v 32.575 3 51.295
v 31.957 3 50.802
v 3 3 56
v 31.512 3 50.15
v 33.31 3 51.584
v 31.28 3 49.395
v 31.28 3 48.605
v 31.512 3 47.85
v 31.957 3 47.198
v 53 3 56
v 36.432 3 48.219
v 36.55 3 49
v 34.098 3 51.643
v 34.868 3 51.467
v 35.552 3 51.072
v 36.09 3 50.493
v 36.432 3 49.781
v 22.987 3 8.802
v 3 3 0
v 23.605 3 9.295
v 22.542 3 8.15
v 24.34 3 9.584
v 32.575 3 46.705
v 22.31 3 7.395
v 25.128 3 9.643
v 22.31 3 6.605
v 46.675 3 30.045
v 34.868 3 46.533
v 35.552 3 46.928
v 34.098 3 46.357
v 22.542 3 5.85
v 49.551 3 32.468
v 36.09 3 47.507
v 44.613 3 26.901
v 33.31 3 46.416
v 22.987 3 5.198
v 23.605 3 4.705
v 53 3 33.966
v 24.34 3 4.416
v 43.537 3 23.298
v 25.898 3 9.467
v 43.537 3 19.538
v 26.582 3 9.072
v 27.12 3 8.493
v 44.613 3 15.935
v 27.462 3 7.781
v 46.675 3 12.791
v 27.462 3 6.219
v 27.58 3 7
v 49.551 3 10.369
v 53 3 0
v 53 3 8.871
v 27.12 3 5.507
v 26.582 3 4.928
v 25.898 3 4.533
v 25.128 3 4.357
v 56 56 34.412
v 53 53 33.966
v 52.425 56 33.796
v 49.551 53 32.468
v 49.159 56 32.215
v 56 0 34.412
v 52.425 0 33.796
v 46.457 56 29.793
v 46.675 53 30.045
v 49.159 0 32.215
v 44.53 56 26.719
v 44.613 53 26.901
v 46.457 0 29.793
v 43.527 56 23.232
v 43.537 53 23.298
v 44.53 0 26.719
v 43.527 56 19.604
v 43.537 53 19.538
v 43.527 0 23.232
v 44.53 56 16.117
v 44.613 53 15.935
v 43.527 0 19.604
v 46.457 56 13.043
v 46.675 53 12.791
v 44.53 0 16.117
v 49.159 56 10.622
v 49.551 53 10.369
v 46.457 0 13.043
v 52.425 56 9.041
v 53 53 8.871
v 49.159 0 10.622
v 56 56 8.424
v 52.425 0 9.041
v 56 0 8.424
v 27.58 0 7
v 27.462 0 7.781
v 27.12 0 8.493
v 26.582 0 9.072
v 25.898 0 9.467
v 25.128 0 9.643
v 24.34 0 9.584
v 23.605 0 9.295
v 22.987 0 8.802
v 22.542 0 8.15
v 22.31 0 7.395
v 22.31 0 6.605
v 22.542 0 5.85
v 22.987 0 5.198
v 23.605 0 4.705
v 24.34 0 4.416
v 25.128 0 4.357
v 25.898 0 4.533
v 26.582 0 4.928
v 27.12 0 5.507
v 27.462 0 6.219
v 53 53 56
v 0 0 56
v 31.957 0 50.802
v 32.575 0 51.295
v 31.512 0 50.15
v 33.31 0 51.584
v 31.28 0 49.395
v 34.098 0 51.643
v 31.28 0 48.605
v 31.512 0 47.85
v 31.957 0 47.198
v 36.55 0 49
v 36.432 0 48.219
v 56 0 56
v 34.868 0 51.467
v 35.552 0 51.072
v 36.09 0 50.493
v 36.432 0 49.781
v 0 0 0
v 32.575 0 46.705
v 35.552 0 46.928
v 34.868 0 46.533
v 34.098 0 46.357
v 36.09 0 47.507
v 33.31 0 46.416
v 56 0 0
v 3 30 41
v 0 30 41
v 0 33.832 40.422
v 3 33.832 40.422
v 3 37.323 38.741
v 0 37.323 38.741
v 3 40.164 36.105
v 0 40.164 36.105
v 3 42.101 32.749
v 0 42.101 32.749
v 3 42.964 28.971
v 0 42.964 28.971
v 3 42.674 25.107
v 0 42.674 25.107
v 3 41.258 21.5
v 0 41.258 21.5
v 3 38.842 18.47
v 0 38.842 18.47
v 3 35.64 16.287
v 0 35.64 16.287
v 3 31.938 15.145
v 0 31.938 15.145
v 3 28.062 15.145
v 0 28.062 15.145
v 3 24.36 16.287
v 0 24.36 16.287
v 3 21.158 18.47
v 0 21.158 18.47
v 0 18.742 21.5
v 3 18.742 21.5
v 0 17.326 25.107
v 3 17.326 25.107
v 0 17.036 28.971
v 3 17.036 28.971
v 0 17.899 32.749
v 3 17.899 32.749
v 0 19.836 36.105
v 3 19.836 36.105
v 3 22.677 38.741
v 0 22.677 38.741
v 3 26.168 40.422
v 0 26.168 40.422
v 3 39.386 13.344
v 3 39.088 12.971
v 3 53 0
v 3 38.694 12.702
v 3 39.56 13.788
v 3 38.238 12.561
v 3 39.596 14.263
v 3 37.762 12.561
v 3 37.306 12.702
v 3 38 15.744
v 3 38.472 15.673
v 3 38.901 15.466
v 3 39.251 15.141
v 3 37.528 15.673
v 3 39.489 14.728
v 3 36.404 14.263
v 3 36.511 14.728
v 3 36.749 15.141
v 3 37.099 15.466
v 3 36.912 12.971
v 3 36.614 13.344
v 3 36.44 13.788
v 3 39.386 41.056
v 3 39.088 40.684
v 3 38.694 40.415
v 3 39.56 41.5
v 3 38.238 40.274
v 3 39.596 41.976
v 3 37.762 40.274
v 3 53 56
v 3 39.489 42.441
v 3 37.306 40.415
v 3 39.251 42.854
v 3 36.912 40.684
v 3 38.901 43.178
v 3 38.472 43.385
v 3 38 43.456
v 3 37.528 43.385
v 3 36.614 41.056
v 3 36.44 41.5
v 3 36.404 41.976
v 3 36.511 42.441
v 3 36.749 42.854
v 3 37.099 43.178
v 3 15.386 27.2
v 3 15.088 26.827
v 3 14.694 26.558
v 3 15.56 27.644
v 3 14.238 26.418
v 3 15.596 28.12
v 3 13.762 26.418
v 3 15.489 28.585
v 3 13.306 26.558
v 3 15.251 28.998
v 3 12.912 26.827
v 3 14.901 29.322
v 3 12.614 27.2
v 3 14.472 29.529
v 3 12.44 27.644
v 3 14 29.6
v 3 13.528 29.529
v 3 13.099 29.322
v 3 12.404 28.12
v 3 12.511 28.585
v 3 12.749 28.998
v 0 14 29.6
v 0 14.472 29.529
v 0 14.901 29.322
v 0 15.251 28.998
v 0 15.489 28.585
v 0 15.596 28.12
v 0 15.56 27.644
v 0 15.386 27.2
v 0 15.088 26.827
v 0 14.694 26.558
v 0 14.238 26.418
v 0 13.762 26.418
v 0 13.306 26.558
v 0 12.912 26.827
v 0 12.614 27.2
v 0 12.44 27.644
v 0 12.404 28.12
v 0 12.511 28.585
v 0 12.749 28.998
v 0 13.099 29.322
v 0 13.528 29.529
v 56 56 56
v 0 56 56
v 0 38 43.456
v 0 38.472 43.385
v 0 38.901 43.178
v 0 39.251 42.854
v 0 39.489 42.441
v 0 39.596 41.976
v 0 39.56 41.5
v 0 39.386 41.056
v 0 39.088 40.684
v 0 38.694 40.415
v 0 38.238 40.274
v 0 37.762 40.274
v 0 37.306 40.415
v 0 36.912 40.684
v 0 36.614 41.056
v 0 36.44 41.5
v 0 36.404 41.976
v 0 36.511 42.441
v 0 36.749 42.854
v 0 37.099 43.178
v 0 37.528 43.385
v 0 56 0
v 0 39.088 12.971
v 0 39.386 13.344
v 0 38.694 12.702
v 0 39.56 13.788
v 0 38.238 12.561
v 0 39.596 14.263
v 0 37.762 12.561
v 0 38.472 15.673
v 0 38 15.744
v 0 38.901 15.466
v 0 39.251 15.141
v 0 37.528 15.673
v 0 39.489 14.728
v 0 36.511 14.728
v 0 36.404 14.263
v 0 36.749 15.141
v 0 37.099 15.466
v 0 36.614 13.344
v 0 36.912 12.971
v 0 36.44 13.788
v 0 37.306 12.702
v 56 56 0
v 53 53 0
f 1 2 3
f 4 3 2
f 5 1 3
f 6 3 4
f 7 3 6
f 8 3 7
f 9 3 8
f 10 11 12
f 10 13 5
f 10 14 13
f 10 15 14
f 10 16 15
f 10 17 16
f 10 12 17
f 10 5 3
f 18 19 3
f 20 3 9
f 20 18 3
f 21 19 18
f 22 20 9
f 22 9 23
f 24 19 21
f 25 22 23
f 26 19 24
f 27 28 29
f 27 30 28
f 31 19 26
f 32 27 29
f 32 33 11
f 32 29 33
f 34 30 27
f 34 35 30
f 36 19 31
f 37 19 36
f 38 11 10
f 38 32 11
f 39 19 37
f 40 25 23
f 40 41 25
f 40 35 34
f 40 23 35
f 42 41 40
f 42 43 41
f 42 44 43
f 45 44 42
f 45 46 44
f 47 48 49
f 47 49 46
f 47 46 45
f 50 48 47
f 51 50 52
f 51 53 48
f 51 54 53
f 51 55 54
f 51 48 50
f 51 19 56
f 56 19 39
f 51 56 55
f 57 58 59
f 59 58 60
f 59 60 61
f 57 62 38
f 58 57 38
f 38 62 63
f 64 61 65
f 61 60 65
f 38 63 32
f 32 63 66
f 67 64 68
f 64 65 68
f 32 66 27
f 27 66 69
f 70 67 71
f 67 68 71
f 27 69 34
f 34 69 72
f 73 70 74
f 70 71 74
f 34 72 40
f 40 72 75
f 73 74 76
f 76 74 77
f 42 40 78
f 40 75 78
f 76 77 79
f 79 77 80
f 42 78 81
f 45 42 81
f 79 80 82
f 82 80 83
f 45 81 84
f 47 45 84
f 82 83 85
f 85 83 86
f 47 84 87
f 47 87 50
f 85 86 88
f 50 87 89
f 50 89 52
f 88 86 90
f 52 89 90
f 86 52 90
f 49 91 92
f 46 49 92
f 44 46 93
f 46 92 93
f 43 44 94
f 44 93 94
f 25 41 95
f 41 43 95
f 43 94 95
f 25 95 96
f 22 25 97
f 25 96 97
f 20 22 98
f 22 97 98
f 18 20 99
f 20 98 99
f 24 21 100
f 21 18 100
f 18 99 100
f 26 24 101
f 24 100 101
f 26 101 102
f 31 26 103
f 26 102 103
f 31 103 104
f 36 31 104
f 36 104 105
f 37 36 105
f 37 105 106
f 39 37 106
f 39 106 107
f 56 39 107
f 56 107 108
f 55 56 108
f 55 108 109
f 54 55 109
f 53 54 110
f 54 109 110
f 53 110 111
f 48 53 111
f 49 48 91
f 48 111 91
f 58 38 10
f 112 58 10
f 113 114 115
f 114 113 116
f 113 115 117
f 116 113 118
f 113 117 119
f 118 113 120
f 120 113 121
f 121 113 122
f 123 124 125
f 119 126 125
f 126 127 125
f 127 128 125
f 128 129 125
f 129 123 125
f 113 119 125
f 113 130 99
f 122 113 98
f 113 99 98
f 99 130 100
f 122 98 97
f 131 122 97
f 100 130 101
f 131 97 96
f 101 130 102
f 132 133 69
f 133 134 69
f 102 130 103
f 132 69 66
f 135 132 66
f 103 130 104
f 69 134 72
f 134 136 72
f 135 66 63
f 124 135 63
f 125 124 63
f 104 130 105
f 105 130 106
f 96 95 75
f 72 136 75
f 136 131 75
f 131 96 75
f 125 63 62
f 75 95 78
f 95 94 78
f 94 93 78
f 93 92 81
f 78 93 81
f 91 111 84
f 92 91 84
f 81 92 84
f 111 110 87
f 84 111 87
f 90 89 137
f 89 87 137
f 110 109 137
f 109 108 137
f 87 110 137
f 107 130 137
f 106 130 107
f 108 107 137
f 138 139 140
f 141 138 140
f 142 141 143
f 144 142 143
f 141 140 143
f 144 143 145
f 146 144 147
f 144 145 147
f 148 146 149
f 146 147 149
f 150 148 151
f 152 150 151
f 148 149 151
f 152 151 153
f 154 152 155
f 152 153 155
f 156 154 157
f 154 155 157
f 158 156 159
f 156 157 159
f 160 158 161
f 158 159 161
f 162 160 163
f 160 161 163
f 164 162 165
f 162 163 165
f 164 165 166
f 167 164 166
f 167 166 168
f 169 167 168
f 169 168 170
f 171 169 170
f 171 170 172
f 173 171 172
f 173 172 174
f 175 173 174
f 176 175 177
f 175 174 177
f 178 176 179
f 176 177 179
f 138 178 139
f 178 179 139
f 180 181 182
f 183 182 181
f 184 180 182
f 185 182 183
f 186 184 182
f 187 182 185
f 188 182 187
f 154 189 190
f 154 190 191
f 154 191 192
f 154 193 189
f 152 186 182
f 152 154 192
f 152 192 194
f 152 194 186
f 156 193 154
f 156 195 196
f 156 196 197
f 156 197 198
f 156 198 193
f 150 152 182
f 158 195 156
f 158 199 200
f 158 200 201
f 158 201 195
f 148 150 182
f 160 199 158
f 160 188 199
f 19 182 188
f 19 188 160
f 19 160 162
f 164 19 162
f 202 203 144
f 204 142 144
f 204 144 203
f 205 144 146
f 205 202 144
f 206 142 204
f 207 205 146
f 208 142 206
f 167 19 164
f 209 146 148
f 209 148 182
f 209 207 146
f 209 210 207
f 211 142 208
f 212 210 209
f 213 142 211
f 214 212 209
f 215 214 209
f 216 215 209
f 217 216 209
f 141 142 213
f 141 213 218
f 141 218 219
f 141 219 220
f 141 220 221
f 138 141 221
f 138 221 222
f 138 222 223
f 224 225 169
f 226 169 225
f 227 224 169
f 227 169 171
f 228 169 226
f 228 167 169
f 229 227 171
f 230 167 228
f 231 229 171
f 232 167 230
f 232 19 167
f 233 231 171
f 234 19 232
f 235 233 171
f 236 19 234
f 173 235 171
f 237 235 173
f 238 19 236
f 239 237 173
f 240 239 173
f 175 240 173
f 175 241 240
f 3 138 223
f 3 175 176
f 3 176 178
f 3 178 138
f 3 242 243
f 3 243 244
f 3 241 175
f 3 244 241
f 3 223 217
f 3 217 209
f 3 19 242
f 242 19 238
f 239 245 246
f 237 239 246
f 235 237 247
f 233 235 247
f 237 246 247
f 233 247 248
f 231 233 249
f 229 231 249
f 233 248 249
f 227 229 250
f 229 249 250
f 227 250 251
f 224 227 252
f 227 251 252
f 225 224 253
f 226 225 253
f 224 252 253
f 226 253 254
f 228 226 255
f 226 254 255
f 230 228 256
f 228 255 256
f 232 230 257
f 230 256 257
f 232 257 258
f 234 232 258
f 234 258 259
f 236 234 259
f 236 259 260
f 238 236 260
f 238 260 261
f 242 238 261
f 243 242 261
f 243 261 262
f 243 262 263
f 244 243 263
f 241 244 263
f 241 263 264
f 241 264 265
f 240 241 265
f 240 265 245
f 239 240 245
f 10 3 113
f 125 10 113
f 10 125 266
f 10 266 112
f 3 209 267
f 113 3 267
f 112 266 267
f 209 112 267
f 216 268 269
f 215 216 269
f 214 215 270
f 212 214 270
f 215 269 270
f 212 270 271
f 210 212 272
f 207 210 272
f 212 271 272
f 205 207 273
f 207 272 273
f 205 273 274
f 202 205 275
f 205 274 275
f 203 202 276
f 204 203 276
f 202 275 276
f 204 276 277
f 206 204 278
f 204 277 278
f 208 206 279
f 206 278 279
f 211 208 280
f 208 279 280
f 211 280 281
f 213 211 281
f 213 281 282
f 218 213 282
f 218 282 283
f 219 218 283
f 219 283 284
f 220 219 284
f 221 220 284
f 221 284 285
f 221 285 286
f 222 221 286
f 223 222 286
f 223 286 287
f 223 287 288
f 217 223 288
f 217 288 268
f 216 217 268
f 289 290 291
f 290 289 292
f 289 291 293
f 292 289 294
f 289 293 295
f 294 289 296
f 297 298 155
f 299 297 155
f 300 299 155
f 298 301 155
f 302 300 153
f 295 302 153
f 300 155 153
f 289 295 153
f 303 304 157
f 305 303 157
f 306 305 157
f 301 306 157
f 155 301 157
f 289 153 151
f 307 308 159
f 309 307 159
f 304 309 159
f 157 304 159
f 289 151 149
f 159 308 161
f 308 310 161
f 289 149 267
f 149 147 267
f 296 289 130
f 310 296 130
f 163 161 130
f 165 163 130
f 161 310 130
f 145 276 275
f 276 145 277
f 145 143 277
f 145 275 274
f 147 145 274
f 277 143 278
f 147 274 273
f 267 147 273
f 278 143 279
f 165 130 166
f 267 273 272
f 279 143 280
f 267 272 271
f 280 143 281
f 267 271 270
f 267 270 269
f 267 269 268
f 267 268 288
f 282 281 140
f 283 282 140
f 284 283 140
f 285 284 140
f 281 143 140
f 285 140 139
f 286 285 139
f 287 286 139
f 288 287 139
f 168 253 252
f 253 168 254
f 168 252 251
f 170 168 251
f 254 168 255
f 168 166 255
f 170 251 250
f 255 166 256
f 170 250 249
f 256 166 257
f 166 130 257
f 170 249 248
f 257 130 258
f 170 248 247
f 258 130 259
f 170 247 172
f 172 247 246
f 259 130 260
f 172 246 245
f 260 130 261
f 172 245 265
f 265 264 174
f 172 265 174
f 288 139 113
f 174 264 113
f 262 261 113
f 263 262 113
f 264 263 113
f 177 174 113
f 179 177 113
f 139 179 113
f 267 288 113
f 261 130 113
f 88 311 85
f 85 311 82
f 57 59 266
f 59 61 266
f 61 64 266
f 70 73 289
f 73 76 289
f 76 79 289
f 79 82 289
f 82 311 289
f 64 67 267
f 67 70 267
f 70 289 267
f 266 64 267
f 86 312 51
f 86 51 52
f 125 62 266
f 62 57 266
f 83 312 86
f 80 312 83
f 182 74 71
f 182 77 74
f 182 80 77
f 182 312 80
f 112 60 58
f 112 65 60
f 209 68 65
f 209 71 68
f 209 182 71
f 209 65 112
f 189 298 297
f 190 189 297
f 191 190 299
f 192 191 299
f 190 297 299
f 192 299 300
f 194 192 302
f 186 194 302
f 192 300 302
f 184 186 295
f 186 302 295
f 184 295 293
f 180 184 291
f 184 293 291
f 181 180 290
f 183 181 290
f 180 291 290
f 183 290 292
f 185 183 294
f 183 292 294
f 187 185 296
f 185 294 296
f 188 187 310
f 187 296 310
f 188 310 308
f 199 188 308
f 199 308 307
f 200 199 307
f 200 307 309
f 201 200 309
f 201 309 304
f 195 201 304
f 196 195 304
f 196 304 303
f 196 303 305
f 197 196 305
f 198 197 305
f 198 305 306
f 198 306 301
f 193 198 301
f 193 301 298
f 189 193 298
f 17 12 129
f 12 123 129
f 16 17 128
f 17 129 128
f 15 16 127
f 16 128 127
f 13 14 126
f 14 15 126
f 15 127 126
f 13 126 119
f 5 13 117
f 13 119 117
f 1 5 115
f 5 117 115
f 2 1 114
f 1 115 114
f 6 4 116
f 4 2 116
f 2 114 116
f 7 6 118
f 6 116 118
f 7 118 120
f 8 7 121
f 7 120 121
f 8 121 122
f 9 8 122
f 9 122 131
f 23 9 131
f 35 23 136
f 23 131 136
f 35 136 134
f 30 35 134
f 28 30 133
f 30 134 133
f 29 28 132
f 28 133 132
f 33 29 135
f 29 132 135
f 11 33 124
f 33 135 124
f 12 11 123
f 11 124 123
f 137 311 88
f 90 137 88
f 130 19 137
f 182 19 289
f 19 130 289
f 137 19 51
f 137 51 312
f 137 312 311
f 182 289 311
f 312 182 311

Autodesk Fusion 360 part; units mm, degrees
sketch "Esboço1" plane through (0, 0, 0) normal (0, 1, 0) x (1, 0, 0)
  line L0 (0, 0) -> (56, 0)
  line L1 (56, -56) -> (0, -56)
  line L2 (0, -56) -> (0, 0)
  line L3 (0, -28) -> (45.1892, -28)
  arc A0 (56, -8.4245) -> (56, -34.4121) centre (56.4, -21.4183) ccw
  line L4 (56, 0) -> (56, -8.4245)
  line L5 (56, -34.4121) -> (56, -56)
  circle A1 centre (24.93, -7) radius 2.65
  circle A2 centre (33.9, -49) radius 2.65
  dimension "d1" = 56
  dimension "d2" = 56
  dimension "d3" = 26
  dimension "d5" = 5.3
  dimension "d6" = 24.93
  dimension "d7" = 21
  dimension "d8" = 5.3
  dimension "d9" = 21
  dimension "d10" = 33.9
  dimension "d47" = 56.4
extrude "Extrusão1" add sketch "Esboço1" along normal blind 3
sketch "Esboço2" plane through (0, 3, 0) normal (0, 1, 0) x (-1, 0, 0)
  circle A0 centre (-24.93, 7) radius 2.65
  circle A1 centre (-33.9, 49) radius 2.65
  arc A2 (-56, 8.4245) -> (-56, 34.4121) centre (-56.4, 21.4183) ccw
  line L0 (-56, 8.4245) -> (-56, 0)
  line L1 (-56, 0) -> (0, 0)
  line L2 (0, 0) -> (0, 56)
  line L3 (0, 56) -> (-56, 56)
  line L4 (-56, 56) -> (-56, 34.4121)
  line L5 (0, 0) -> (-3, 0)
  line L6 (-3, 0) -> (-3, 56)
  line L7 (-3, 56) -> (0, 56)
  line L8 (0, 56) -> (0, 0)
extrude "Extrusão2" add sketch "Esboço2" along normal blind 53 contours L1 L2 L3 L5 L6 L7 L8
sketch "Esboço3" plane through (0, 0, 0) normal (-1, 0, 0) x (0, 0, 1)
  line L0 (0, 0) -> (56, 0)
  line L1 (56, 0) -> (56, 56)
  line L2 (56, 56) -> (0, 56)
  line L3 (0, 56) -> (0, 0)
  circle A0 centre (28, 30) radius 13
  circle A1 centre (28, 14) radius 1.6
  circle A2 centre (14.1436, 38) radius 1.6
  circle A3 centre (41.8564, 38) radius 1.6
  dimension "d15" = 26
  dimension "d16" = 30
  dimension "d19" = 3.2
  dimension "d20" = 16
  dimension "d21" = 8
  dimension "d22" = 13.8564
extrude "Extrusão3" cut sketch "Esboço3" against normal blind 6.5 contours A0 | A1 | A2 | A3
sketch "Esboço6" plane through (3, 0, 0) normal (1, 0, 0) x (0, 0, -1)
  circle A0 centre (-41.8564, 38) radius 1.6
  circle A1 centre (-28, 14) radius 1.6
  circle A2 centre (-14.1436, 38) radius 1.6
  circle A3 centre (-28, 30) radius 13
  line L0 (-56, 3) -> (0, 3)
  line L1 (0, 3) -> (0, 56)
  line L2 (0, 56) -> (-56, 56)
  line L3 (-56, 56) -> (-56, 3)
  line L4 (-56, 56) -> (0, 56)
  line L5 (0, 56) -> (0, 53)
  line L6 (0, 53) -> (-56, 53)
  line L7 (-56, 53) -> (-56, 56)
  dimension "d48" = 3
extrude "Extrusão6" add sketch "Esboço6" along normal blind 53 contours L1 L2 L3 L4 L5 L6 L7
sketch "Esboço7" plane through (0, 53, 0) normal (0, -1, 0) x (1, 0, 0)
  line L0 (3, 56) -> (3, 0)
  line L1 (3, 0) -> (56, 0)
  line L2 (56, 0) -> (56, 56)
  line L3 (56, 56) -> (3, 56)
  line L4 (56, 0) -> (53, 0)
  line L5 (53, 0) -> (53, 56)
  line L6 (53, 56) -> (56, 56)
  line L7 (56, 56) -> (56, 0)
  dimension "d51" = 3
extrude "Extrusão7" add sketch "Esboço7" along normal blind 50 contours L1 L2 L3 L4 L5 L6 L7
sketch "Esboço8" plane through (0, 0, 0) normal (0, -1, 0) x (1, 0, 0)
  circle A0 centre (33.9, 49) radius 2.65
  circle A1 centre (24.93, 7) radius 2.65
  arc A2 (56, 34.4121) -> (56, 8.4245) centre (56.4, 21.4183) ccw
  line L0 (56, 34.4121) -> (56, 56)
  line L1 (56, 56) -> (0, 56)
  line L2 (0, 56) -> (0, 0)
  line L3 (0, 0) -> (56, 0)
  line L4 (56, 0) -> (56, 8.4245)
  circle A3 centre (56.4, 21.4183) radius 13
extrude "Extrusão8" cut sketch "Esboço8" against normal blind 69 contours A2 A3
